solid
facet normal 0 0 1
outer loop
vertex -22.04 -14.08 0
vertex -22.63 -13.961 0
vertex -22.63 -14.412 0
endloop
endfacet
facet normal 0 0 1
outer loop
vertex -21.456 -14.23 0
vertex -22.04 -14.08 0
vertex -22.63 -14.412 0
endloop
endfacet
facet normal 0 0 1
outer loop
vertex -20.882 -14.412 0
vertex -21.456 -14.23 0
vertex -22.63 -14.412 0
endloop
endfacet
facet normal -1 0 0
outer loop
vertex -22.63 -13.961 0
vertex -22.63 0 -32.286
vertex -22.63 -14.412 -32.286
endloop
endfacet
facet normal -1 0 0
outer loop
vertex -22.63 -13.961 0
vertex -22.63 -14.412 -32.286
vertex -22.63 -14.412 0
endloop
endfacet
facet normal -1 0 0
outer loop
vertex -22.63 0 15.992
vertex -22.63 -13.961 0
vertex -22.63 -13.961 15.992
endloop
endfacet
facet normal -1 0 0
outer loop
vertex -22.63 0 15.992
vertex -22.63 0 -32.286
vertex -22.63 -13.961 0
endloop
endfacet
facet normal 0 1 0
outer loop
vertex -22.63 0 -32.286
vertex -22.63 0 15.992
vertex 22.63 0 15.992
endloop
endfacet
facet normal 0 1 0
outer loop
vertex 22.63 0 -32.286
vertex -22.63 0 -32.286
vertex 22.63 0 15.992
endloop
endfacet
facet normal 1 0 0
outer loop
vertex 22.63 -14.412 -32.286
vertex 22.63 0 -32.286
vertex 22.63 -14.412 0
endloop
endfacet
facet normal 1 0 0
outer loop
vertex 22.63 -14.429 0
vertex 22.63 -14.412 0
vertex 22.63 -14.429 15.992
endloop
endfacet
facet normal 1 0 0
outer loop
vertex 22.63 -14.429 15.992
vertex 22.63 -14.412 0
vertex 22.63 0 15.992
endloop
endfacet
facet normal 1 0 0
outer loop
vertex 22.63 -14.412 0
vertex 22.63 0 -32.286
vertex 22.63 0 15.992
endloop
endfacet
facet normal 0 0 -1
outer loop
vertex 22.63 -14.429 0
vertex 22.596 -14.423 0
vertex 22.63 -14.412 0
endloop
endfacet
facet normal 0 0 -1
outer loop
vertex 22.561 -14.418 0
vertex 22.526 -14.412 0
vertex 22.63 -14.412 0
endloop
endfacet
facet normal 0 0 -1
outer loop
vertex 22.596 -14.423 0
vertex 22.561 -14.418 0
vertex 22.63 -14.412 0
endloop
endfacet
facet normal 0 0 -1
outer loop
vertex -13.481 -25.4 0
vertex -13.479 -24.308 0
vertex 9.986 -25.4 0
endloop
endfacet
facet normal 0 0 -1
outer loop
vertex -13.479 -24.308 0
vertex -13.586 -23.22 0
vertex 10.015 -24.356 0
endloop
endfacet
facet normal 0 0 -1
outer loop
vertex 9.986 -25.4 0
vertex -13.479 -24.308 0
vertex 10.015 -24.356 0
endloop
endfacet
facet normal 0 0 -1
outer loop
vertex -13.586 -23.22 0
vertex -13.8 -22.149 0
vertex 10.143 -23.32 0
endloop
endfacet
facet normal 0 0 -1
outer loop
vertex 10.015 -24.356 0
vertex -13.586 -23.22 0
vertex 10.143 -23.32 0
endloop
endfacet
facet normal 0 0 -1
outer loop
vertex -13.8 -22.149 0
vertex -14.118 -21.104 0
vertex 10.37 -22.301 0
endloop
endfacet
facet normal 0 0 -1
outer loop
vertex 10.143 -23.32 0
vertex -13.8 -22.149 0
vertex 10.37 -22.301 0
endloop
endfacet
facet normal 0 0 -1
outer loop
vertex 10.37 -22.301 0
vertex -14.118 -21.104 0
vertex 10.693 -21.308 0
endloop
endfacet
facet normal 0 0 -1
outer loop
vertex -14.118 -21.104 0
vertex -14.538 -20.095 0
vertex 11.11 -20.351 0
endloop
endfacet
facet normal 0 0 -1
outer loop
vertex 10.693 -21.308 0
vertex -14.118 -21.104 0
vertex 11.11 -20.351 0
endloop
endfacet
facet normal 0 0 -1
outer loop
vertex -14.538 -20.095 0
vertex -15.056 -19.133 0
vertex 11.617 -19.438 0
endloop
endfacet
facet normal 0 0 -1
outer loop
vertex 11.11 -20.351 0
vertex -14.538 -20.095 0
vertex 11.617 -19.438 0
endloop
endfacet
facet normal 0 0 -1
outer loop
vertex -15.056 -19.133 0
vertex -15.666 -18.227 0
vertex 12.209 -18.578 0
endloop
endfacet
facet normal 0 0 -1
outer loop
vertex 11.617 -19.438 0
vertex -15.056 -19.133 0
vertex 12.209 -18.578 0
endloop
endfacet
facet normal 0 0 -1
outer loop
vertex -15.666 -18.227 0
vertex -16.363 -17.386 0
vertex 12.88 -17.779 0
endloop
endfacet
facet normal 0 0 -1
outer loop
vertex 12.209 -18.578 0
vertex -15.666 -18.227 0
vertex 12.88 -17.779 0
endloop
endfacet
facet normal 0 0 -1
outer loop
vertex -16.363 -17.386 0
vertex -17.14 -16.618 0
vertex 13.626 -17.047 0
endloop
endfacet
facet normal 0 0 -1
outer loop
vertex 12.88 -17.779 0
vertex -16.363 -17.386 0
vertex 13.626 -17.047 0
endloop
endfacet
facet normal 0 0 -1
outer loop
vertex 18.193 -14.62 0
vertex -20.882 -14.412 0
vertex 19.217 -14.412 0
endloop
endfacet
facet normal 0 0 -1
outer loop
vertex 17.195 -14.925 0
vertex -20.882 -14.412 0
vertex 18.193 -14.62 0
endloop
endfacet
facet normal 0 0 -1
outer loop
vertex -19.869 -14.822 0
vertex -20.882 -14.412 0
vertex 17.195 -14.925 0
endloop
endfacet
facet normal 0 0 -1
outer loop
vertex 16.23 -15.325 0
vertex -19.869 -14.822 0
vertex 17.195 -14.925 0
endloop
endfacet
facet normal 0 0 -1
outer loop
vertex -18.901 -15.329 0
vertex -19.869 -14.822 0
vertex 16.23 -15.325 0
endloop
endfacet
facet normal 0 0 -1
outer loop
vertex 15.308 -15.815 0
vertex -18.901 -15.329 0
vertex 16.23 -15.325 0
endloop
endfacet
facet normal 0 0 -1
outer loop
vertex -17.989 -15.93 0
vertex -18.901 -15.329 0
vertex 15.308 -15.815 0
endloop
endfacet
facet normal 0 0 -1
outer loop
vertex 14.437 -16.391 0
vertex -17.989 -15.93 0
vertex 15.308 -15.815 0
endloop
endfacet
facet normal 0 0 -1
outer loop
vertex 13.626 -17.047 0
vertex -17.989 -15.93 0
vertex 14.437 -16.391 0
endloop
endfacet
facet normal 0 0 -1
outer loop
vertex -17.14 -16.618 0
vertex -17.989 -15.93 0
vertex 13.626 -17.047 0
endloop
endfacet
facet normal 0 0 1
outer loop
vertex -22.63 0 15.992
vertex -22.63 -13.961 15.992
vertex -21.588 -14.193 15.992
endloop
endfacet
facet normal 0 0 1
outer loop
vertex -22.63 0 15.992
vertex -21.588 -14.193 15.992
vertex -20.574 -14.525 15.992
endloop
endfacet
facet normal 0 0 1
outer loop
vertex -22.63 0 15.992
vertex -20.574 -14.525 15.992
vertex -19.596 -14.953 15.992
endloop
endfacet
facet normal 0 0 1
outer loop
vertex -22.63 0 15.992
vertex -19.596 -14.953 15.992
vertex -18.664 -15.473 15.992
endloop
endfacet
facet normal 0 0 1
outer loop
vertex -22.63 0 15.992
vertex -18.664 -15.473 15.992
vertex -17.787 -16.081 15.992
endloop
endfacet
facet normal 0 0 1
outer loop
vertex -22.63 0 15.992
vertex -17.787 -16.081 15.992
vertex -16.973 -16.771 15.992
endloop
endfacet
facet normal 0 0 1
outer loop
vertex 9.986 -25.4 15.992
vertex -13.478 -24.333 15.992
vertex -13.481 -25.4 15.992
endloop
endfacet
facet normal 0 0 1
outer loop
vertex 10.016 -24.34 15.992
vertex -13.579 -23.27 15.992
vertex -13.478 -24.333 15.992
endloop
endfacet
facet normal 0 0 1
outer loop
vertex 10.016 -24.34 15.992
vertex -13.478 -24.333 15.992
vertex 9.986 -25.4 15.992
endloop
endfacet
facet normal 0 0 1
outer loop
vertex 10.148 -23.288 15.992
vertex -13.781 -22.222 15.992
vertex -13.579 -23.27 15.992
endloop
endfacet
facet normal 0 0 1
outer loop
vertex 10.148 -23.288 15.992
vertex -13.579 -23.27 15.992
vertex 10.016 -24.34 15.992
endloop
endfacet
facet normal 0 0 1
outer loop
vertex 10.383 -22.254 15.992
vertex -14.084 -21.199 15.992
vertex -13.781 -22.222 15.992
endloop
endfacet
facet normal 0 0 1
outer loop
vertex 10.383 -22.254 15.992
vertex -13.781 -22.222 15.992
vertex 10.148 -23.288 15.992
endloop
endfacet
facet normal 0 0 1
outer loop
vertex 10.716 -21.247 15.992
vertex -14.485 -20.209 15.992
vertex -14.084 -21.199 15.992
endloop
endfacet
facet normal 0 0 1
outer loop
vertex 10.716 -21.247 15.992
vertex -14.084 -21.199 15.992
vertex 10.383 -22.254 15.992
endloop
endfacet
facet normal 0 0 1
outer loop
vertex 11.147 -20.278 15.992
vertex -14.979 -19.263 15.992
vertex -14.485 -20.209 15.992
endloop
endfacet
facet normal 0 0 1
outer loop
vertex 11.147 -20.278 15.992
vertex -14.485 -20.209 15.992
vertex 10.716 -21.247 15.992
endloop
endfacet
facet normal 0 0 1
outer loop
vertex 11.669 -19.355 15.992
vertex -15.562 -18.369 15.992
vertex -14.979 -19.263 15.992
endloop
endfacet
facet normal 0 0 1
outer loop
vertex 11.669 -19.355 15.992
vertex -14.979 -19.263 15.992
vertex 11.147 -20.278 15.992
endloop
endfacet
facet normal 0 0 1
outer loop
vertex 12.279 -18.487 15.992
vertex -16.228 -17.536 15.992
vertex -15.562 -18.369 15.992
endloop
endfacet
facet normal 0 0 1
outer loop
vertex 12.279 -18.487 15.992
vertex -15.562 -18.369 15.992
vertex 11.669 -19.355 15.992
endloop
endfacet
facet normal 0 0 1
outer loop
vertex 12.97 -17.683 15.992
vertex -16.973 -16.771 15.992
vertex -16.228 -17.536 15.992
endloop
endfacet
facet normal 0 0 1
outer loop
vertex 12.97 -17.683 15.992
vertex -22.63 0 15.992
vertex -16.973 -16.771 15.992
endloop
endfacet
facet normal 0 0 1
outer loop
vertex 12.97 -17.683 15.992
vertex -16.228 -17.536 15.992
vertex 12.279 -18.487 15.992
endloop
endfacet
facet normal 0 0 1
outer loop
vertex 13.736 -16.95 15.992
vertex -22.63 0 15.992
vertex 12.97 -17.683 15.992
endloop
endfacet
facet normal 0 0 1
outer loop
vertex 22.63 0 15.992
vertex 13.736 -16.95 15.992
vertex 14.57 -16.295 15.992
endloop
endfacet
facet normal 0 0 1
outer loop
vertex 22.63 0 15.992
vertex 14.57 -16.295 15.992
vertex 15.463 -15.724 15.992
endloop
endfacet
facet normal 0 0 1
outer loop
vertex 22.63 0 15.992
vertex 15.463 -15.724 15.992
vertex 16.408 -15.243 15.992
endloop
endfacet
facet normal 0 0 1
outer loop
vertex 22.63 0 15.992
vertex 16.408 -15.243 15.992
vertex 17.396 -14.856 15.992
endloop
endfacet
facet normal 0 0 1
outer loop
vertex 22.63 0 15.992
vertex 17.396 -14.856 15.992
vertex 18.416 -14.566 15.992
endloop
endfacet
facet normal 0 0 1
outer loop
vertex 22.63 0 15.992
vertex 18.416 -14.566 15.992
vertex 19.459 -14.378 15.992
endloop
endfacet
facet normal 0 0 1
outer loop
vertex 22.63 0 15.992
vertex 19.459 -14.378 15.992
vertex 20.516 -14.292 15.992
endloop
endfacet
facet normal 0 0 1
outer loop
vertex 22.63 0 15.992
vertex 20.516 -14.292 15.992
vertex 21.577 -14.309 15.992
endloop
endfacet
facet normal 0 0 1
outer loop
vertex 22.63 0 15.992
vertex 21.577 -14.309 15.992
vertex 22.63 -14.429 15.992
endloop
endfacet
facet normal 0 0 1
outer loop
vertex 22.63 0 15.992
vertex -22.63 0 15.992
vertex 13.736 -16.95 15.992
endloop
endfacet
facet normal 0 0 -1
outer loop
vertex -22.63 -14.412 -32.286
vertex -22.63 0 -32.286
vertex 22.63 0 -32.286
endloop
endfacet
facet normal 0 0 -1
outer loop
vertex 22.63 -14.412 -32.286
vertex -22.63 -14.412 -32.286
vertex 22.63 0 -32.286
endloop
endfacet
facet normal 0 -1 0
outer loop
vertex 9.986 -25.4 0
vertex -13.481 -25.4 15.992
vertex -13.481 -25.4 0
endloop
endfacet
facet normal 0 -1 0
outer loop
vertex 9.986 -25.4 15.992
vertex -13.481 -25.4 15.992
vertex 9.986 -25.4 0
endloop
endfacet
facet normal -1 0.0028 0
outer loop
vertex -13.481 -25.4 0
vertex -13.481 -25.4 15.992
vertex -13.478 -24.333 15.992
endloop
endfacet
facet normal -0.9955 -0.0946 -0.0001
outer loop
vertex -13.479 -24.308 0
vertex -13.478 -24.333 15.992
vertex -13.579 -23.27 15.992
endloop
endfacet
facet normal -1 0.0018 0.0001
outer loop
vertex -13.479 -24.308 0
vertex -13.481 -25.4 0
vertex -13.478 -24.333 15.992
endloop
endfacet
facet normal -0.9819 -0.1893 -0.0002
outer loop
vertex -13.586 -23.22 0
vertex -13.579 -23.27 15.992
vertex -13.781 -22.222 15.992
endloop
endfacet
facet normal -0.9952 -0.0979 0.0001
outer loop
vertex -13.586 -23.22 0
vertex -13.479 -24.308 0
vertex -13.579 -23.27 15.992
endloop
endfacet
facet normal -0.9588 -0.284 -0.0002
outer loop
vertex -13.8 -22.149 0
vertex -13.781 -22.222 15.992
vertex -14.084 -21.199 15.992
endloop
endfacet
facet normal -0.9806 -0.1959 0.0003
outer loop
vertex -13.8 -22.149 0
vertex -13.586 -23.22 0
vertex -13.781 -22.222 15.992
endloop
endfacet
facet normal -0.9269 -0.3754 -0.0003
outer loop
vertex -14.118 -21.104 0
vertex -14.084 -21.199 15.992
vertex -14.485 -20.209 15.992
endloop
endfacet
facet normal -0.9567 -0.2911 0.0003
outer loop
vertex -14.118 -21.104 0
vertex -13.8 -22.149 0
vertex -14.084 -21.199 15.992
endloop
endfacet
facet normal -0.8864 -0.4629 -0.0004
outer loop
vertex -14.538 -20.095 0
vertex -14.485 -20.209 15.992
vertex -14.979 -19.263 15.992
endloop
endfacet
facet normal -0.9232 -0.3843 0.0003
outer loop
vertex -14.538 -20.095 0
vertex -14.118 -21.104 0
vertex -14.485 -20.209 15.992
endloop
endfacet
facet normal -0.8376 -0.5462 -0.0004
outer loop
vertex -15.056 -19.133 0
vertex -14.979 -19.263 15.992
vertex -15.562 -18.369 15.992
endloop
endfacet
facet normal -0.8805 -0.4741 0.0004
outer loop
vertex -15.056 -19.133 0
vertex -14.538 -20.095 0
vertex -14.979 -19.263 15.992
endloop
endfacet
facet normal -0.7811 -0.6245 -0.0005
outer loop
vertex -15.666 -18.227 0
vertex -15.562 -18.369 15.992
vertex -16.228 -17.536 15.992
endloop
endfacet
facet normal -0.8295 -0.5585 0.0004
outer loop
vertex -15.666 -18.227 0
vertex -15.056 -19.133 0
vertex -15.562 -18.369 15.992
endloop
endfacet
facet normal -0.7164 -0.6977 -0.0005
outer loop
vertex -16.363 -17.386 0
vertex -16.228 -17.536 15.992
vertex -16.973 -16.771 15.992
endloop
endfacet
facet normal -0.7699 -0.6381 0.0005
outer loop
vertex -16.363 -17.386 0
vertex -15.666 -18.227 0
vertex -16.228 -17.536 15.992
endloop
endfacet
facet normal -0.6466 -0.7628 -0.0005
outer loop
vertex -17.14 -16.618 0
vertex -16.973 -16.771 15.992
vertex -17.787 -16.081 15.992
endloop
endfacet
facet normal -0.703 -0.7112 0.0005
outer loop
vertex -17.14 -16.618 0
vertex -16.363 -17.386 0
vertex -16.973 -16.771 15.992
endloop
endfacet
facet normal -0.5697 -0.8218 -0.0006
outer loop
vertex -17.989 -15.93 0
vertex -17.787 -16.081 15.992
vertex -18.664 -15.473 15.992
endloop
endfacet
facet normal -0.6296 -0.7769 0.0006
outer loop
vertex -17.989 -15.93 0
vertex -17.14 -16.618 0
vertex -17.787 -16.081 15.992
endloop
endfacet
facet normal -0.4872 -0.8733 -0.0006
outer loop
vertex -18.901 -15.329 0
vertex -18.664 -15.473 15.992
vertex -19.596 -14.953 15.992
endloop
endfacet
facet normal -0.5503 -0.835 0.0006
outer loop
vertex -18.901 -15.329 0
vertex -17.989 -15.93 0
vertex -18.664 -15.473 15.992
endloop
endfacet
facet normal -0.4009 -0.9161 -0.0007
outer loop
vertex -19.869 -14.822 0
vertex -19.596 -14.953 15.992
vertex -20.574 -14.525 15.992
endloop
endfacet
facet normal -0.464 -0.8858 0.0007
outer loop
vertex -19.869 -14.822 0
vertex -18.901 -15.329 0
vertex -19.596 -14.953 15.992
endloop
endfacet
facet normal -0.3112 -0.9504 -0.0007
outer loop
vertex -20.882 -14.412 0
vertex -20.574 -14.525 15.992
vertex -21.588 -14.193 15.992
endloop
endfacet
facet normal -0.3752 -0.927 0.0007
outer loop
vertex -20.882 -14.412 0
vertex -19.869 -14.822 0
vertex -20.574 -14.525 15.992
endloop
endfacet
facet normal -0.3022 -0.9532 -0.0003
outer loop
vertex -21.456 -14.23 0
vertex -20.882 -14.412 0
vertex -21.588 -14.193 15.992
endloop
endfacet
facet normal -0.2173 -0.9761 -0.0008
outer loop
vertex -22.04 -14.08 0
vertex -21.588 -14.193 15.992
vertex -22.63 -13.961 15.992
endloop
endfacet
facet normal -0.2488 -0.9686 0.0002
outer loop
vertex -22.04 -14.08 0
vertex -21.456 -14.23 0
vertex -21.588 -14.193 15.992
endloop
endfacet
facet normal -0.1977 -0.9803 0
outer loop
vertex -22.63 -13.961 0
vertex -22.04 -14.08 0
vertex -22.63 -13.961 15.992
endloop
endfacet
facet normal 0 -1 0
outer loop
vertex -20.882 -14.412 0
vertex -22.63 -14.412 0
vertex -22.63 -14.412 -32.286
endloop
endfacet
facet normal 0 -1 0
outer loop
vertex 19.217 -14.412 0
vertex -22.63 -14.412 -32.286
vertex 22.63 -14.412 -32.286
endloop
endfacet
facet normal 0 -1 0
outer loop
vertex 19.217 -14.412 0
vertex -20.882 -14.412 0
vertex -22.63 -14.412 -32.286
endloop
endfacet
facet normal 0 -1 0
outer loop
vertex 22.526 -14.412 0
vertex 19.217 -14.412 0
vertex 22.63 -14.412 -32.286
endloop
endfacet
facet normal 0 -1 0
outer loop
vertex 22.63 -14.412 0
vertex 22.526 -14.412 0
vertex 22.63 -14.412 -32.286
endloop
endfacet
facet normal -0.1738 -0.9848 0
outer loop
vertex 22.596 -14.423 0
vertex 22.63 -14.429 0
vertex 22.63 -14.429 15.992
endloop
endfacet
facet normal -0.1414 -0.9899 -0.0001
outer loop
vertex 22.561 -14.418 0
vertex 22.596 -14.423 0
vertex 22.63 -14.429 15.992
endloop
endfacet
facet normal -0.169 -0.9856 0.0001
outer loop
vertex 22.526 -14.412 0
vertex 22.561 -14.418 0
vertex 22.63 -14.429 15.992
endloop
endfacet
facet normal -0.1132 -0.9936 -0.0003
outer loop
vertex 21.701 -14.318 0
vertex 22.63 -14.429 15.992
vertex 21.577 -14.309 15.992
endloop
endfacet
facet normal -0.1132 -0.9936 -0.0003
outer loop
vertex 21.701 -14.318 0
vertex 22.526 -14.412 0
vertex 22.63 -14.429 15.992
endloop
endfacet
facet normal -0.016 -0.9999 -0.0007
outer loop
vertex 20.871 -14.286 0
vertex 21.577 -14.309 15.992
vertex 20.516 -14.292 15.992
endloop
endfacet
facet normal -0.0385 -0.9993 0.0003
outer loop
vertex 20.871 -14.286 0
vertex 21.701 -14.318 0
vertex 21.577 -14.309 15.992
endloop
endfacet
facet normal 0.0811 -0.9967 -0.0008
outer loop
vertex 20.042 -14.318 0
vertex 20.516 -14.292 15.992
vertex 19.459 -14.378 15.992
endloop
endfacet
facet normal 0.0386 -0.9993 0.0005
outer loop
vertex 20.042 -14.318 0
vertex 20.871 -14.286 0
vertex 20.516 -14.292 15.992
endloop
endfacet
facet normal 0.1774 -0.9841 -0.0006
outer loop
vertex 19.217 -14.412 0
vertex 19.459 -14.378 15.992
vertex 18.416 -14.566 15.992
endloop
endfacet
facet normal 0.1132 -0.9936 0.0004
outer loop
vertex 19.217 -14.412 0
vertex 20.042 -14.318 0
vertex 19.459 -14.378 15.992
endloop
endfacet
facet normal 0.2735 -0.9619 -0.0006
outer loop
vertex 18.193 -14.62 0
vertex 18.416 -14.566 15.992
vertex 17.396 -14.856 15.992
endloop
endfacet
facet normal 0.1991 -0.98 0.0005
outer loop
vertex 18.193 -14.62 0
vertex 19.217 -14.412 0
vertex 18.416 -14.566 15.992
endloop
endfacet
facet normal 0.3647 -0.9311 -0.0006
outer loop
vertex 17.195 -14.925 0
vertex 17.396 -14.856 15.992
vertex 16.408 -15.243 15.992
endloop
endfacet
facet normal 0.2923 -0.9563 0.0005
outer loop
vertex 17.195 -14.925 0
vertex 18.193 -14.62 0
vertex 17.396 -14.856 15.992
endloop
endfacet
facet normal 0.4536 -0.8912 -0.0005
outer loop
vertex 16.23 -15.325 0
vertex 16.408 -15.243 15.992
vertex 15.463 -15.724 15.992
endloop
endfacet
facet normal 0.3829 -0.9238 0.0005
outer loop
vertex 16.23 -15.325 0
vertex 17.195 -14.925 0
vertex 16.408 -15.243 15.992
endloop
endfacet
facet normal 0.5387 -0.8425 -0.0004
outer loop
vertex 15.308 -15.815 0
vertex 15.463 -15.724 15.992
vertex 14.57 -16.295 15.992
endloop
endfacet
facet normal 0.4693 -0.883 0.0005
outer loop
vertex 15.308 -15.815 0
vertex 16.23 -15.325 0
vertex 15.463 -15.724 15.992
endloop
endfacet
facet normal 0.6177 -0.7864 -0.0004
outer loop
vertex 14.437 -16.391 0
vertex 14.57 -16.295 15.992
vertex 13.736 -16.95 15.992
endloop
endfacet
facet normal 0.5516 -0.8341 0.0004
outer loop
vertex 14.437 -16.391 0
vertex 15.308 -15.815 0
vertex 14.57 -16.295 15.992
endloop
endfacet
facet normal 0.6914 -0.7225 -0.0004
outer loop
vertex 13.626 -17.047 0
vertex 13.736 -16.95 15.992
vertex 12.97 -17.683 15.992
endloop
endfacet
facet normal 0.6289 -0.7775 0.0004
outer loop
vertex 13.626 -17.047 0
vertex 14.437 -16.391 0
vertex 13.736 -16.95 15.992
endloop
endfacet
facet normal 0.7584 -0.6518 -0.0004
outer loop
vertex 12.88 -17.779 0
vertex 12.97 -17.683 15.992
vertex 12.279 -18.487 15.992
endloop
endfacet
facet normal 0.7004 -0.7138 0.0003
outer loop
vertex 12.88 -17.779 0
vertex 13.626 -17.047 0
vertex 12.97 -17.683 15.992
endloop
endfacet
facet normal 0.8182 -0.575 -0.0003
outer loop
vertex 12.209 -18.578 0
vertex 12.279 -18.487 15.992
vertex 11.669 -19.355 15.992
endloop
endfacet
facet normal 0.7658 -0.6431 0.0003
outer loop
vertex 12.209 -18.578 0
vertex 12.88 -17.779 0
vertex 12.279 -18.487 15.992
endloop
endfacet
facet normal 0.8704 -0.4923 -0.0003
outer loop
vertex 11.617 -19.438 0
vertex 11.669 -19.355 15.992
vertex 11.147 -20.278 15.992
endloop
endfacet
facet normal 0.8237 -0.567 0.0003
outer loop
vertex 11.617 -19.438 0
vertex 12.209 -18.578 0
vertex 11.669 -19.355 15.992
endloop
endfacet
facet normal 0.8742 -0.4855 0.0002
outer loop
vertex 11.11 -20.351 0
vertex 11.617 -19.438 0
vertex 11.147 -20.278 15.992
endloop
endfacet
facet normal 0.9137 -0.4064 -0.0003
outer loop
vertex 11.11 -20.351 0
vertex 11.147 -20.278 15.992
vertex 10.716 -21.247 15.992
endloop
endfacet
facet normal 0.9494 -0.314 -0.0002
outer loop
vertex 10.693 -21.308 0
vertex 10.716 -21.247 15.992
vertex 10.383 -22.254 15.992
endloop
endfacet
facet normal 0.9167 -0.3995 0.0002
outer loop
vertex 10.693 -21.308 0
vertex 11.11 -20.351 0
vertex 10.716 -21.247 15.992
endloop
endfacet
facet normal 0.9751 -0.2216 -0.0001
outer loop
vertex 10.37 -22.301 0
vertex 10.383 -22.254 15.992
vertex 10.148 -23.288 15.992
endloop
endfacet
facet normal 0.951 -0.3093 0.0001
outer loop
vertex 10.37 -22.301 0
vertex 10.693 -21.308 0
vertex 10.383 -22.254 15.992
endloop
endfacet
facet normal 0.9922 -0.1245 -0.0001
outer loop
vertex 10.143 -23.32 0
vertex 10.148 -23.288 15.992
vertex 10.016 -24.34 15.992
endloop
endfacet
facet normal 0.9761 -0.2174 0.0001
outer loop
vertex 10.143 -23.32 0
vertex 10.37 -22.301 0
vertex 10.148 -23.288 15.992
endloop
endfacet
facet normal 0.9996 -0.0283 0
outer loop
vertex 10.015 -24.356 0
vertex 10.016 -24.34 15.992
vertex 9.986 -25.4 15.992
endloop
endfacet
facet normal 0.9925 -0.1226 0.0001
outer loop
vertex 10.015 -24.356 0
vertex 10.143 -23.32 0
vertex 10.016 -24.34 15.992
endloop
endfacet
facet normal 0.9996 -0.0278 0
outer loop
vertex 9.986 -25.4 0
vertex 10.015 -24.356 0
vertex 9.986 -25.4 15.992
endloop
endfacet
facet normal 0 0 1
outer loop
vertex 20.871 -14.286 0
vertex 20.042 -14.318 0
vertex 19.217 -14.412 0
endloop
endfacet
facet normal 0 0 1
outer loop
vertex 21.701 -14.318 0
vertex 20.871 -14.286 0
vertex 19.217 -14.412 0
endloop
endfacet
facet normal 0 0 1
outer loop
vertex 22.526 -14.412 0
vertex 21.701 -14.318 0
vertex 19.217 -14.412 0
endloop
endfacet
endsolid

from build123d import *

# Parameters (mm, degrees)
F0_W     = 45.260496
F0_H     = 48.27787
F1_DEPTH = 25.4
F2_W     = 53.21525
F2_H     = 15.521124
F3_DEPTH = 39.375179
F4_R     = 10.887602
F4_R_2   = 11.039472
F5_DEPTH = 23.324139


with BuildPart() as f1:
    # F0 (on Front) → F1 (new body)
    with BuildSketch(Plane.XZ):
        with Locations((4e-06, -8.146919)):
            Rectangle(F0_W, F0_H)
    extrude(amount=F1_DEPTH)

    # F2 (on Top) → F3 (cut)
    with BuildSketch(Plane.XY):
        with Locations((-0.739105, -22.17301)):
            Rectangle(F2_W, F2_H)
    extrude(amount=-F3_DEPTH, mode=Mode.SUBTRACT)

    # F4 (on Top) → F5 (cut)
    with BuildSketch(Plane.XY):
        with Locations((20.871415, -25.173559)):
            Circle(F4_R)
        with Locations((-24.506071, -24.840043)):
            Circle(F4_R_2)
    extrude(amount=F5_DEPTH, mode=Mode.SUBTRACT)


solid = f1.part
